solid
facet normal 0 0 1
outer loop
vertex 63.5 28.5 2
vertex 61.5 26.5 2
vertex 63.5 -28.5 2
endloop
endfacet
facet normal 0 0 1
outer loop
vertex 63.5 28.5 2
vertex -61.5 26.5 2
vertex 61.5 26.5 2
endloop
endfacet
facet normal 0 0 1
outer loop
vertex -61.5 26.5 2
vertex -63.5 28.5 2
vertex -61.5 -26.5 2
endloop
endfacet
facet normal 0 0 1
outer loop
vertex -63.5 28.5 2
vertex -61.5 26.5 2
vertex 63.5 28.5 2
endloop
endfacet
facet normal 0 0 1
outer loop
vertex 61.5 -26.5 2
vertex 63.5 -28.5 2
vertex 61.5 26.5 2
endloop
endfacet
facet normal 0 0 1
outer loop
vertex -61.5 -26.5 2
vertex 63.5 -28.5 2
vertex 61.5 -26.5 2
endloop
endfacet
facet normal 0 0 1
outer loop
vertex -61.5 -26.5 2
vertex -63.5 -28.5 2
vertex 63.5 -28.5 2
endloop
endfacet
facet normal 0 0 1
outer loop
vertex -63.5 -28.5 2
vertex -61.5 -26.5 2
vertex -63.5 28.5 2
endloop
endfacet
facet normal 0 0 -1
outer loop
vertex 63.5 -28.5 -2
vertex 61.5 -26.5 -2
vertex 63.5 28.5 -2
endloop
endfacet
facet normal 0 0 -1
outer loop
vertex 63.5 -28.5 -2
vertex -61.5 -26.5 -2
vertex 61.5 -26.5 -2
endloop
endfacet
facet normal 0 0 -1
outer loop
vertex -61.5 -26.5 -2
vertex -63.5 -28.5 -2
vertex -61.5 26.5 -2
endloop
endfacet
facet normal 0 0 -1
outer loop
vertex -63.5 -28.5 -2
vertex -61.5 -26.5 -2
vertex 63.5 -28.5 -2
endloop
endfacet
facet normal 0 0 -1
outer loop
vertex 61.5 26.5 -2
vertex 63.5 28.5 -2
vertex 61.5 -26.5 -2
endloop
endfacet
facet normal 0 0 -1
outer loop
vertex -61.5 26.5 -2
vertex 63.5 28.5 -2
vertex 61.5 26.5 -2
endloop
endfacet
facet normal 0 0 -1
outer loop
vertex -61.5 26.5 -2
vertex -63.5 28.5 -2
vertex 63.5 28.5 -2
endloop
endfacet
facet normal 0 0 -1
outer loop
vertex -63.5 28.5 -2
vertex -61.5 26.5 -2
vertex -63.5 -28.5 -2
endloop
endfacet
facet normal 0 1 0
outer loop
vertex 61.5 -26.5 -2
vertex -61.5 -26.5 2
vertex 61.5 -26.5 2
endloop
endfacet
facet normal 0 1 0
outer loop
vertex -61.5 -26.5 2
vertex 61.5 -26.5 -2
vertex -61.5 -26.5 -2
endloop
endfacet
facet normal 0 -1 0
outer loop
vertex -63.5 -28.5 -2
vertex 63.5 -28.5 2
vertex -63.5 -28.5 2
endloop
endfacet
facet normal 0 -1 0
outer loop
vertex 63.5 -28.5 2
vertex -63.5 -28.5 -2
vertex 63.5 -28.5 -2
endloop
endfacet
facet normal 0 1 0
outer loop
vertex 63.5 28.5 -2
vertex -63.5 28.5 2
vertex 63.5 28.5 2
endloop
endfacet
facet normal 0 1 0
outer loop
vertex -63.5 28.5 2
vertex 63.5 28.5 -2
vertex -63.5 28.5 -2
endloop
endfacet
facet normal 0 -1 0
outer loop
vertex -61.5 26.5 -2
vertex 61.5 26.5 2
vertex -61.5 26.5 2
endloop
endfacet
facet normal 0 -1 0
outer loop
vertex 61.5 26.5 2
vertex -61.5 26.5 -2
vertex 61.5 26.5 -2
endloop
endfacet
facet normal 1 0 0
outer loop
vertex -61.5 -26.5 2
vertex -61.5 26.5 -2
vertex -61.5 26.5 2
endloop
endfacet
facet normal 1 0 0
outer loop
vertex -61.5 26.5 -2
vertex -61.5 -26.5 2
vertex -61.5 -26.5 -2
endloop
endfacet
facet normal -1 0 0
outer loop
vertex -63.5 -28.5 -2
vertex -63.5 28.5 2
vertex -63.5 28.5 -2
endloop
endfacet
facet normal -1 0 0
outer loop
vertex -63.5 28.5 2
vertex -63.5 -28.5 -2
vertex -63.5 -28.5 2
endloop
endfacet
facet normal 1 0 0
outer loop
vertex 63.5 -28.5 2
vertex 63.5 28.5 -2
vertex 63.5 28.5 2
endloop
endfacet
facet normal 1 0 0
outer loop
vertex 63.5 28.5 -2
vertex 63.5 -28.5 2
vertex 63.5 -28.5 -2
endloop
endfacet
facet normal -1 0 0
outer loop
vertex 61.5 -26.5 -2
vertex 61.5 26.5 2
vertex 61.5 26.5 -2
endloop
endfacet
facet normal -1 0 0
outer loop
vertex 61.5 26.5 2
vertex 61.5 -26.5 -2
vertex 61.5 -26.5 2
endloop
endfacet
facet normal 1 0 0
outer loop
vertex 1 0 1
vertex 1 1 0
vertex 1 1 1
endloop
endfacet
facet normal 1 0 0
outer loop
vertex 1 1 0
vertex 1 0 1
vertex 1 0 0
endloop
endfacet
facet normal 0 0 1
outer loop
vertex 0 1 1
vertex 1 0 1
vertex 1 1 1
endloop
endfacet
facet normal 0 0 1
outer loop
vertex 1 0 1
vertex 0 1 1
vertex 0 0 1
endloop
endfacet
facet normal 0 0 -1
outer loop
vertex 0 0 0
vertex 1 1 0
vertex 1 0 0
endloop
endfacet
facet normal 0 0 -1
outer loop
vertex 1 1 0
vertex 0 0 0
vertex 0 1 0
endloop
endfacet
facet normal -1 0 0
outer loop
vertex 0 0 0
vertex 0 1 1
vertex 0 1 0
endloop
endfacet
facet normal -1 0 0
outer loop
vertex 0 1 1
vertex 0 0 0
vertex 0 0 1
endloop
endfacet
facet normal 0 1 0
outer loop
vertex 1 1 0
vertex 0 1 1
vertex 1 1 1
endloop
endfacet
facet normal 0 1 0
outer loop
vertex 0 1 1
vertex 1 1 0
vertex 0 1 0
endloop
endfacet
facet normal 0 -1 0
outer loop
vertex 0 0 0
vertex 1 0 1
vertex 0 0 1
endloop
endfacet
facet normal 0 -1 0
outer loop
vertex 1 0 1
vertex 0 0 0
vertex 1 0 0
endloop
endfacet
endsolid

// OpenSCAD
STRUCTURE_SLOT_W = 35;
STRUCTURE_SLOT_L = 125;

SWEEP_BEARING_W = STRUCTURE_SLOT_W + 20;

//SWEEP_BEARING_LEGS
SWEEP_BEARING_LEG_L = STRUCTURE_SLOT_L + 2;
SWEEP_BEARING_LEG_WIDTH = 2;
SWEEP_BEARING_LEG_HEIGHT = 4;

for(SIGN = [-1,1]){
translate([0,SIGN * (SWEEP_BEARING_W/2),0])
cube([STRUCTURE_SLOT_L,
      SWEEP_BEARING_LEG_WIDTH,
      SWEEP_BEARING_LEG_HEIGHT],
      center=true);
}

SWEEP_BEARING_CROSS_BAR_WIDTH = 2;
SWEEP_BEARING_CROSS_BAR_HEIGHT = 4;

//SWEEP_BEARING_CROSS_BARS + SWEEP_BEARING_HOLES
difference(){
    union(){
        //SWEEP_BEARING_CROSS_BARS
        for(SIGN = [-1,1]){
            translate([STRUCTURE_SLOT_L/2 * SIGN, 0,0]){
                cube([SWEEP_BEARING_CROSS_BAR_WIDTH, 
                      SWEEP_BEARING_W + SWEEP_BEARING_LEG_WIDTH,
                      SWEEP_BEARING_CROSS_BAR_HEIGHT],
                      center = true);
           }
        }
        //BUFFER FOR SWEEP BEARING HOLES
        for(SIGN = [-1,1]){
            cube([
            
            ]);
        }
    }
}
